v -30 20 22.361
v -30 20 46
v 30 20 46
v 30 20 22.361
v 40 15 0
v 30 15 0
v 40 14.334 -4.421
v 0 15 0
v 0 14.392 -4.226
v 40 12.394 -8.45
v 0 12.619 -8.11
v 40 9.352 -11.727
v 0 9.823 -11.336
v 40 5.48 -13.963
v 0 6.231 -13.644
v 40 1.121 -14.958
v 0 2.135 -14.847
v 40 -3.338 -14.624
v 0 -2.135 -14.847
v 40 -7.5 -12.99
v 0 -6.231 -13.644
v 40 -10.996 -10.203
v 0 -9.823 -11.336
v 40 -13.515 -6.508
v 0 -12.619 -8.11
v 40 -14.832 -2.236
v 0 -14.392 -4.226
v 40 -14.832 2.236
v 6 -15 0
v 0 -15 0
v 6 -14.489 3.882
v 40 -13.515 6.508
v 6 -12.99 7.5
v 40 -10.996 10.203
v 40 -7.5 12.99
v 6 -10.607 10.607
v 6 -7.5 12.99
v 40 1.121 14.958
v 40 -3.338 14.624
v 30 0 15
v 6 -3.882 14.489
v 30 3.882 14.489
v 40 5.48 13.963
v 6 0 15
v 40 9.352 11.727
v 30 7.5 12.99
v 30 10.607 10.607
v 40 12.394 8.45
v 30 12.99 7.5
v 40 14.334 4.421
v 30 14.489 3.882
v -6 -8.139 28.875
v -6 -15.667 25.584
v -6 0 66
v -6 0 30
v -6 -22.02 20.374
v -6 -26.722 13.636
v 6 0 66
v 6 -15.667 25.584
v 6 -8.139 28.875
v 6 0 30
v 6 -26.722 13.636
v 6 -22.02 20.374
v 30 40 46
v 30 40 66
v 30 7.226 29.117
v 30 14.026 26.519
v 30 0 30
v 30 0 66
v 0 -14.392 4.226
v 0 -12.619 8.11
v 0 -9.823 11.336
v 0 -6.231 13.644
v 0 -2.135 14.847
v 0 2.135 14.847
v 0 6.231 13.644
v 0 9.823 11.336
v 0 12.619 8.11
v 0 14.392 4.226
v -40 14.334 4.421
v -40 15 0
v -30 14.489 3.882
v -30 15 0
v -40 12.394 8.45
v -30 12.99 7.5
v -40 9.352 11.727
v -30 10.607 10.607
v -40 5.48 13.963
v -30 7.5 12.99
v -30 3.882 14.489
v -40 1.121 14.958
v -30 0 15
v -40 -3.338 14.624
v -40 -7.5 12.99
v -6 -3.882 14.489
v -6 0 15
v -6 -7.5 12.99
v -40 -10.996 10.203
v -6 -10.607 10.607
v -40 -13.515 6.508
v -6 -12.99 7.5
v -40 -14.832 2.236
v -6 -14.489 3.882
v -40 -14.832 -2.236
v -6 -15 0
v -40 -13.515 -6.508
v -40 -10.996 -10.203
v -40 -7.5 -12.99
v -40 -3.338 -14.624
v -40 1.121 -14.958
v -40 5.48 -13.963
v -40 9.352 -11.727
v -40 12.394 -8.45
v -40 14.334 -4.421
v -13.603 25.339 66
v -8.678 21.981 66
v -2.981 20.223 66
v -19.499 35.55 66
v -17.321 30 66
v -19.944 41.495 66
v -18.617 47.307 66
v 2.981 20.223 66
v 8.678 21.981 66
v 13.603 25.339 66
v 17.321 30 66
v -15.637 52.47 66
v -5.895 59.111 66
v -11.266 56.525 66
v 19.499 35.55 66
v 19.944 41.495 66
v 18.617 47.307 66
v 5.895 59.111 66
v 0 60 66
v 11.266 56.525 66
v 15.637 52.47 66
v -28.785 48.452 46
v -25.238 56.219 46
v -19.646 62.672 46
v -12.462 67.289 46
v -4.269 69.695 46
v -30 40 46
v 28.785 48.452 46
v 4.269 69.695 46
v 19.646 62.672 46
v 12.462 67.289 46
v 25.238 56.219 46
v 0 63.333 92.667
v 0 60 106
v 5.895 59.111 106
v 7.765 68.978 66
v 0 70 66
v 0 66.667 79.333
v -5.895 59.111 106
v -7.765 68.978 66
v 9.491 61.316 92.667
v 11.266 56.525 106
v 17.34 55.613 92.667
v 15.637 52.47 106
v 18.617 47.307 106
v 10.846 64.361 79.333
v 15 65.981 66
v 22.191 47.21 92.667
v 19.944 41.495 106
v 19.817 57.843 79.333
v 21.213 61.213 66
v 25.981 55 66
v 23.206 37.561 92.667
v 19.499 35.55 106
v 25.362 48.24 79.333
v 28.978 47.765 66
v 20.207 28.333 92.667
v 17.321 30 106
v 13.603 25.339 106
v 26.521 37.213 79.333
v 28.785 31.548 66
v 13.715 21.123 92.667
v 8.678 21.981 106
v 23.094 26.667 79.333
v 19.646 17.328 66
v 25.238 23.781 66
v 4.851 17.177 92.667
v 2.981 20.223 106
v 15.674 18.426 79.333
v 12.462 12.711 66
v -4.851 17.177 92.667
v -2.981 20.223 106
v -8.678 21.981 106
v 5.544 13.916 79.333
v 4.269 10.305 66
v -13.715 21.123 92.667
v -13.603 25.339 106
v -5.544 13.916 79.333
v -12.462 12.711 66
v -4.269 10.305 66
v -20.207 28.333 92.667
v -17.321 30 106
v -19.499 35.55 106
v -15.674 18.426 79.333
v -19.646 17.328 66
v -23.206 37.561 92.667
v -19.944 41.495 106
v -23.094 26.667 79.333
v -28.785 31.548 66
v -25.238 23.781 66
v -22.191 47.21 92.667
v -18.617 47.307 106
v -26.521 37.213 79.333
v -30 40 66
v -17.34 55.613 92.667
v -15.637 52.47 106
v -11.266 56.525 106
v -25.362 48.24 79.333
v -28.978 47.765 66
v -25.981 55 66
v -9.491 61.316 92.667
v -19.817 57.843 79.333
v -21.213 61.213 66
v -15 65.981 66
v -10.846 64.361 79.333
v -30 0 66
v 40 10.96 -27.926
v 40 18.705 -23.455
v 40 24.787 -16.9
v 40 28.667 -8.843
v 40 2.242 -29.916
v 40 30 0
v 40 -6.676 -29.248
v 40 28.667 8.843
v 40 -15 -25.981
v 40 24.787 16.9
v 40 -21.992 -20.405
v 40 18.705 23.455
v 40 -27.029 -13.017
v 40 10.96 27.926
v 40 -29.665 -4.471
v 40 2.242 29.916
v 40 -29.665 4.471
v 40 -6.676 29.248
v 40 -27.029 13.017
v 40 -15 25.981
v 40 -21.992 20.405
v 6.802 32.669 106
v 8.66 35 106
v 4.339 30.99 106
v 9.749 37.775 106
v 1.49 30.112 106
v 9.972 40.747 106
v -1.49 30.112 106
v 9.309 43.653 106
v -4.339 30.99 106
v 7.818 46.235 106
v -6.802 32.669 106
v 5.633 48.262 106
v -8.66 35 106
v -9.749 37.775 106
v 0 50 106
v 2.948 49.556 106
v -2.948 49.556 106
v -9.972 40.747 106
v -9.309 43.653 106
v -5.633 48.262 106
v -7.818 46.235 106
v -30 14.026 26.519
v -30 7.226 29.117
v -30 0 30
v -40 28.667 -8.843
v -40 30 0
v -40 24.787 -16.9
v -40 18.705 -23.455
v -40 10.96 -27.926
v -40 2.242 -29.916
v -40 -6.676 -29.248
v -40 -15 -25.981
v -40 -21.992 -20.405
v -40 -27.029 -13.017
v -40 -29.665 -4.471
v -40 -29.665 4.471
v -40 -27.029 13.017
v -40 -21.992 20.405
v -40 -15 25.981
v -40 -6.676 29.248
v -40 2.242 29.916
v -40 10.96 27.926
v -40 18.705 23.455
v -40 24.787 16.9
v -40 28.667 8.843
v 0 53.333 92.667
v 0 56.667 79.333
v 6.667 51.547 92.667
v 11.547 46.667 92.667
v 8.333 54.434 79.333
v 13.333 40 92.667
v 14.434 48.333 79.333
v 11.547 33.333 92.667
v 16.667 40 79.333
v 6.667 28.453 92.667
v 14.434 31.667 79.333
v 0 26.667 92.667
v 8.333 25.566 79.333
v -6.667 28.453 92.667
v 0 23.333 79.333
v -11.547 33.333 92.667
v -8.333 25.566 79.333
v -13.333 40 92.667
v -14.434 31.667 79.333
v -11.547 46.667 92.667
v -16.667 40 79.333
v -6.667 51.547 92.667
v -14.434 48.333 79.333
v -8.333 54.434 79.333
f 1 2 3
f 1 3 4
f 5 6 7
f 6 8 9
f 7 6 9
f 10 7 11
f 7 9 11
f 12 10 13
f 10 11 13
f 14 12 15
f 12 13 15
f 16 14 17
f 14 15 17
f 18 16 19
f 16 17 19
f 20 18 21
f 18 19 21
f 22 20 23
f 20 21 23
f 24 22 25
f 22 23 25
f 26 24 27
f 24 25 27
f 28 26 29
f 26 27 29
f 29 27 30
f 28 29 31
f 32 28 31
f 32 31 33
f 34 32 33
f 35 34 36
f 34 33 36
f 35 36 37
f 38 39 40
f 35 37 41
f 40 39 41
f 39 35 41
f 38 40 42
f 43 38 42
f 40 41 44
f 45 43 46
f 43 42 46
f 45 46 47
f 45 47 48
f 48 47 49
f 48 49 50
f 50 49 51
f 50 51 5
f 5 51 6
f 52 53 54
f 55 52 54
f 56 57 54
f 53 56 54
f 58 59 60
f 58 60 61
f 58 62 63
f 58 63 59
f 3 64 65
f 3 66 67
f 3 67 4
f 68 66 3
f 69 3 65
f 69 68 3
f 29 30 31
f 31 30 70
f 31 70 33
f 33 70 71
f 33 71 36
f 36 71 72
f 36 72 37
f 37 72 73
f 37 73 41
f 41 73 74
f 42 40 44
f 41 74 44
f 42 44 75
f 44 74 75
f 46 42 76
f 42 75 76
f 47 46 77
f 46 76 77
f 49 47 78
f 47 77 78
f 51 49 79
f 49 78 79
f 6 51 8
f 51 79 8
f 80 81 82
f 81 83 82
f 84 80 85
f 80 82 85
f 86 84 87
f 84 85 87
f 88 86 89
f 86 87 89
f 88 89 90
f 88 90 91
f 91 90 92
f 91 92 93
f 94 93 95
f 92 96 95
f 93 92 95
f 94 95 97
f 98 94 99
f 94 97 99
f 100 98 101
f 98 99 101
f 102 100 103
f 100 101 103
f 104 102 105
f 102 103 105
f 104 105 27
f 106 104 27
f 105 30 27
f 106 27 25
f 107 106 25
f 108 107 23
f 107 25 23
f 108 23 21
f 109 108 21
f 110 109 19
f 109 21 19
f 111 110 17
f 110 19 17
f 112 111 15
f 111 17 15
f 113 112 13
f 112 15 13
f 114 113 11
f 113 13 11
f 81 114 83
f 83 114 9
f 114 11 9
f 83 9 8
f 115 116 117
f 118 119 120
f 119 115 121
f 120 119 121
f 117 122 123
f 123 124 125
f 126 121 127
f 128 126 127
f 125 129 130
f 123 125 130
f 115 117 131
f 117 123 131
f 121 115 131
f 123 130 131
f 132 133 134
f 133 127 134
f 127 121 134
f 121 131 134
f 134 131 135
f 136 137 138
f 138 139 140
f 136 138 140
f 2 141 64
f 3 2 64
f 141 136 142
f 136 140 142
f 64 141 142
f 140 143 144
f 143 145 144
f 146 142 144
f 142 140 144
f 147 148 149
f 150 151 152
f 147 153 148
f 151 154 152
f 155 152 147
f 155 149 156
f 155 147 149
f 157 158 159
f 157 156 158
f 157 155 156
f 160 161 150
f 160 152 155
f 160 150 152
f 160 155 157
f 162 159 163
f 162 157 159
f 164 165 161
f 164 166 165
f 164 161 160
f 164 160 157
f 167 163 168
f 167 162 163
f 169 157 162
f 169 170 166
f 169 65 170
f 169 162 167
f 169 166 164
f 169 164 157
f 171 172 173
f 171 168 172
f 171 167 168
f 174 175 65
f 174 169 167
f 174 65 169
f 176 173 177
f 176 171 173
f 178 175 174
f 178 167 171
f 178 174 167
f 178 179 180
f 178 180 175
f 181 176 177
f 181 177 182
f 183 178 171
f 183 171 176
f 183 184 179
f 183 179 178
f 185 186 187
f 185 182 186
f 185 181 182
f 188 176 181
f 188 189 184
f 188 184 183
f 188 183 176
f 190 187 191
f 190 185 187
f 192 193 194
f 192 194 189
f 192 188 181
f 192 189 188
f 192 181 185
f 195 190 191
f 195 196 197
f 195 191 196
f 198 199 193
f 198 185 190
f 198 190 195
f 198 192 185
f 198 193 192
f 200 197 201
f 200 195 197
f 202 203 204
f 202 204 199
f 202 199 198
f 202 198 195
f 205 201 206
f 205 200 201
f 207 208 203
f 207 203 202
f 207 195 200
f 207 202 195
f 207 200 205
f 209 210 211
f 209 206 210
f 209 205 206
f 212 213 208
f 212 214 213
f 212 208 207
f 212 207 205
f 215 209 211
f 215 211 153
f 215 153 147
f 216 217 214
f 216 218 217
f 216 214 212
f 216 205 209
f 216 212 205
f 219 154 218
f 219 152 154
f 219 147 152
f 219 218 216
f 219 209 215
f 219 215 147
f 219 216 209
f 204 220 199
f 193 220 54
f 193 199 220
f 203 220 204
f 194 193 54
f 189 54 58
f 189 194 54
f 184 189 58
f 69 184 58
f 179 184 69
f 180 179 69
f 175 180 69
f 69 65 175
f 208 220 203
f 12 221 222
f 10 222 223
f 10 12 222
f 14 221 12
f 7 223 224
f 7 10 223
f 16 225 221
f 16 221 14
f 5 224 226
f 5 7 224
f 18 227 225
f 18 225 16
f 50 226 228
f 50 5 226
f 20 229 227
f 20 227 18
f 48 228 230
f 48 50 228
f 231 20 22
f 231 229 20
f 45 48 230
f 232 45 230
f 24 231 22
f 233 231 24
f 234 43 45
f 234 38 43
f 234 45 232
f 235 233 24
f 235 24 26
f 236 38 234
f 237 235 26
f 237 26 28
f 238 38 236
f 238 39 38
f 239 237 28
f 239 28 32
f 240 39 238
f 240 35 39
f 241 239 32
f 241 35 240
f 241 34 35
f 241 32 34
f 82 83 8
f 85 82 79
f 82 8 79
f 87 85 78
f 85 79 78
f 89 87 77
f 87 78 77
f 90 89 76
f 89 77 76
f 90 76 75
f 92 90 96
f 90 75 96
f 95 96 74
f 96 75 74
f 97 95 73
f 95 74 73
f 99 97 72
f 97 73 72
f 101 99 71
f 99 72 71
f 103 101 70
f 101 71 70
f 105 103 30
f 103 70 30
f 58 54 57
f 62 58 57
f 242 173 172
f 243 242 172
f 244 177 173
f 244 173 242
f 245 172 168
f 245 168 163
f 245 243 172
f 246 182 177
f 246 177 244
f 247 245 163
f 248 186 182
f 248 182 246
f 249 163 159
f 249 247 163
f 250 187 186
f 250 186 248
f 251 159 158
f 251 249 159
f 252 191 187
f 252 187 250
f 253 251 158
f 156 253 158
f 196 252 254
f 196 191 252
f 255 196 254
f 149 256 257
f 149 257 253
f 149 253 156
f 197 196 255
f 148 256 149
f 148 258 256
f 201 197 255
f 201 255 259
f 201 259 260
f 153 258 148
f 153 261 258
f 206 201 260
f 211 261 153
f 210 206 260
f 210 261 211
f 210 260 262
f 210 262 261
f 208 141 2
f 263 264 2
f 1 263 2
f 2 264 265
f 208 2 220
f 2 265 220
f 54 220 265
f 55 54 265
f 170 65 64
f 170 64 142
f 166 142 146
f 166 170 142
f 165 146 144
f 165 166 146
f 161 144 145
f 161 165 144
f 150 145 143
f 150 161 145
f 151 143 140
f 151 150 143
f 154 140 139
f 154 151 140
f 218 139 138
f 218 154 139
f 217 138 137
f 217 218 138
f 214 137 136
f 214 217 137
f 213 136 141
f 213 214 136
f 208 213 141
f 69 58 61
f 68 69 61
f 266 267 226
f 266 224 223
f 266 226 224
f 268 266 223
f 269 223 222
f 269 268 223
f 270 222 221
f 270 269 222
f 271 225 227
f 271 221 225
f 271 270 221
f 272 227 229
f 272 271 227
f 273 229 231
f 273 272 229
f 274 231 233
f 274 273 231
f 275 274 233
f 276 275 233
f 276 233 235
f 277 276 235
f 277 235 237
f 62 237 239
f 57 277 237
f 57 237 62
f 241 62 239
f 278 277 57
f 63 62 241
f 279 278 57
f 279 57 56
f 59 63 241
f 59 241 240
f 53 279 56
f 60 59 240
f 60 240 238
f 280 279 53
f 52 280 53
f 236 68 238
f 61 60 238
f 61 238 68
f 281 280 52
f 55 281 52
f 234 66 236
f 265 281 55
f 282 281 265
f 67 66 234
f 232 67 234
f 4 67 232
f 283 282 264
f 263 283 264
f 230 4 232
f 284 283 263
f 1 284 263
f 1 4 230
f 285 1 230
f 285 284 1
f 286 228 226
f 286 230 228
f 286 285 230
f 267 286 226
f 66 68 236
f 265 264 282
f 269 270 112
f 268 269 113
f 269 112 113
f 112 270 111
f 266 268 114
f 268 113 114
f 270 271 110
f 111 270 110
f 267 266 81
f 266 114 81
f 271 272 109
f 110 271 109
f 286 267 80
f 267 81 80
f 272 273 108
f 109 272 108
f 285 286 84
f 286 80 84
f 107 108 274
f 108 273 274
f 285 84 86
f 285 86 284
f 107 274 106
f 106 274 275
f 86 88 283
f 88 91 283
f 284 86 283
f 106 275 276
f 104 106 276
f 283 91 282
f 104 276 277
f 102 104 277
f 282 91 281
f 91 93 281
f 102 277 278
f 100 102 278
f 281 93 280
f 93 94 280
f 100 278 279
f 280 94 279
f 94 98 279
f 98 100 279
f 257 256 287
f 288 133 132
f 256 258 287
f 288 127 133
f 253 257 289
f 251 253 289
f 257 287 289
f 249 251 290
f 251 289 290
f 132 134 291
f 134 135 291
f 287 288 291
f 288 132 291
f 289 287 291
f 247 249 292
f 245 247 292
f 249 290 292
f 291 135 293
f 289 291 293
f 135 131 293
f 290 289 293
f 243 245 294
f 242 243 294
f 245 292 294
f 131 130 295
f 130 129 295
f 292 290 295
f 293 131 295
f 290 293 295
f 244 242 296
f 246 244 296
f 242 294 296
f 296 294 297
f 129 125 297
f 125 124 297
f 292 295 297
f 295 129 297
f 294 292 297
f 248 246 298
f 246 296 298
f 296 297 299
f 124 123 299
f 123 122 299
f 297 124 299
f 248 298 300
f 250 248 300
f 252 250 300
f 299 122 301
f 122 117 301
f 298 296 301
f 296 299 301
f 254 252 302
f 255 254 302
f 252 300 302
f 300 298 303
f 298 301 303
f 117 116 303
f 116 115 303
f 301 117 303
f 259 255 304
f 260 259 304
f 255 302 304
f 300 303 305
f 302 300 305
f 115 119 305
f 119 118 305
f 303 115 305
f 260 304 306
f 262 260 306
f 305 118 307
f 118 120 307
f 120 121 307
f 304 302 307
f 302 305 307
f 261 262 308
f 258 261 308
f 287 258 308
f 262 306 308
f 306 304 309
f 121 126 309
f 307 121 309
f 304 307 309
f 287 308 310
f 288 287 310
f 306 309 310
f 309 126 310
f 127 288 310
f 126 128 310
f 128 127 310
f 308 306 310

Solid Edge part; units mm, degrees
sketch "Sketch1" plane through (0, 0, 0) normal (1, 0, 0) x (0, 1, 0)
  circle A0 centre (0, 0) radius 30
  circle A1 centre (0, 0) radius 15
extrude "Protrusion1" add sketch "Sketch1" along normal mid plane 80
sketch "Sketch2" plane through (0, 0, 66) normal (0, 0, 1) x (1, 0, 0)
  line L0 (30, 0) -> (30, 40)
  line L1 (-30, 0) -> (-30, 40)
  line L2 (0, 0) -> (-30, 0)
  line L3 (0, 0) -> (30, 0)
  arc A0 (-30, 40) -> (30, 40) centre (0, 40) cw
extrude "ExtrudedProtrusion_3" add sketch "Sketch2" against normal blind 20
sketch "Sketch3" plane through (0, 0, 0) normal (1, 0, 0) x (0, 1, 0)
  line L0 (0, 46) -> (0, 0)
  line L1 (0, 0) -> (20.4926, 0)
  line L2 (20.4926, 0) -> (20, 22.3607)
  line L3 (20, 46) -> (20, 22.3607)
  line L4 (0, 46) -> (20, 46)
extrude "ExtrudedProtrusion_4" add sketch "Sketch3" along normal mid plane 60
sketch "Sketch4" plane through (0, 0, 0) normal (1, 0, 0) x (0, 1, 0)
  line L0 (0, 66) -> (-26.7217, 13.6364)
  line L1 (-26.7217, 13.6364) -> (-26.7217, 0)
  line L2 (-26.7217, 0) -> (0, 0)
  line L3 (0, 0) -> (0, 66)
extrude "ExtrudedProtrusion_5" add sketch "Sketch4" along normal mid plane 12
sketch "Sketch5" plane through (0, 0, 0) normal (1, 0, 0) x (0, 1, 0)
  circle A0 centre (0, 0) radius 15
extrude "ExtrudedCutout_2" cut sketch "Sketch5" along normal mid plane 321.4657
sketch "Sketch6" plane through (0, 0, 0) normal (1, 0, 0) x (0, 1, 0)
  line L0 (40, 106) -> (60, 106)
  line L1 (60, 106) -> (70, 66)
  line L2 (70, 66) -> (40, 66)
  line L3 (40, 66) -> (40, 106)
revolve "RevolvedProtrusion1" add sketch "Sketch6" angle 360 about axis through (0, 40, 66) along (0, 0, 1)
sketch "Sketch7" plane through (0, 0, 0) normal (1, 0, 0) x (0, 1, 0)
  line L0 (60, 66) -> (50, 106)
  line L1 (50, 106) -> (40, 106)
  line L2 (40, 106) -> (40, 66)
  line L3 (40, 66) -> (60, 66)
revolve "RevolvedCutout1" cut sketch "Sketch7" angle 360 about axis through (0, 40, 106) along (0, 0, -1)
